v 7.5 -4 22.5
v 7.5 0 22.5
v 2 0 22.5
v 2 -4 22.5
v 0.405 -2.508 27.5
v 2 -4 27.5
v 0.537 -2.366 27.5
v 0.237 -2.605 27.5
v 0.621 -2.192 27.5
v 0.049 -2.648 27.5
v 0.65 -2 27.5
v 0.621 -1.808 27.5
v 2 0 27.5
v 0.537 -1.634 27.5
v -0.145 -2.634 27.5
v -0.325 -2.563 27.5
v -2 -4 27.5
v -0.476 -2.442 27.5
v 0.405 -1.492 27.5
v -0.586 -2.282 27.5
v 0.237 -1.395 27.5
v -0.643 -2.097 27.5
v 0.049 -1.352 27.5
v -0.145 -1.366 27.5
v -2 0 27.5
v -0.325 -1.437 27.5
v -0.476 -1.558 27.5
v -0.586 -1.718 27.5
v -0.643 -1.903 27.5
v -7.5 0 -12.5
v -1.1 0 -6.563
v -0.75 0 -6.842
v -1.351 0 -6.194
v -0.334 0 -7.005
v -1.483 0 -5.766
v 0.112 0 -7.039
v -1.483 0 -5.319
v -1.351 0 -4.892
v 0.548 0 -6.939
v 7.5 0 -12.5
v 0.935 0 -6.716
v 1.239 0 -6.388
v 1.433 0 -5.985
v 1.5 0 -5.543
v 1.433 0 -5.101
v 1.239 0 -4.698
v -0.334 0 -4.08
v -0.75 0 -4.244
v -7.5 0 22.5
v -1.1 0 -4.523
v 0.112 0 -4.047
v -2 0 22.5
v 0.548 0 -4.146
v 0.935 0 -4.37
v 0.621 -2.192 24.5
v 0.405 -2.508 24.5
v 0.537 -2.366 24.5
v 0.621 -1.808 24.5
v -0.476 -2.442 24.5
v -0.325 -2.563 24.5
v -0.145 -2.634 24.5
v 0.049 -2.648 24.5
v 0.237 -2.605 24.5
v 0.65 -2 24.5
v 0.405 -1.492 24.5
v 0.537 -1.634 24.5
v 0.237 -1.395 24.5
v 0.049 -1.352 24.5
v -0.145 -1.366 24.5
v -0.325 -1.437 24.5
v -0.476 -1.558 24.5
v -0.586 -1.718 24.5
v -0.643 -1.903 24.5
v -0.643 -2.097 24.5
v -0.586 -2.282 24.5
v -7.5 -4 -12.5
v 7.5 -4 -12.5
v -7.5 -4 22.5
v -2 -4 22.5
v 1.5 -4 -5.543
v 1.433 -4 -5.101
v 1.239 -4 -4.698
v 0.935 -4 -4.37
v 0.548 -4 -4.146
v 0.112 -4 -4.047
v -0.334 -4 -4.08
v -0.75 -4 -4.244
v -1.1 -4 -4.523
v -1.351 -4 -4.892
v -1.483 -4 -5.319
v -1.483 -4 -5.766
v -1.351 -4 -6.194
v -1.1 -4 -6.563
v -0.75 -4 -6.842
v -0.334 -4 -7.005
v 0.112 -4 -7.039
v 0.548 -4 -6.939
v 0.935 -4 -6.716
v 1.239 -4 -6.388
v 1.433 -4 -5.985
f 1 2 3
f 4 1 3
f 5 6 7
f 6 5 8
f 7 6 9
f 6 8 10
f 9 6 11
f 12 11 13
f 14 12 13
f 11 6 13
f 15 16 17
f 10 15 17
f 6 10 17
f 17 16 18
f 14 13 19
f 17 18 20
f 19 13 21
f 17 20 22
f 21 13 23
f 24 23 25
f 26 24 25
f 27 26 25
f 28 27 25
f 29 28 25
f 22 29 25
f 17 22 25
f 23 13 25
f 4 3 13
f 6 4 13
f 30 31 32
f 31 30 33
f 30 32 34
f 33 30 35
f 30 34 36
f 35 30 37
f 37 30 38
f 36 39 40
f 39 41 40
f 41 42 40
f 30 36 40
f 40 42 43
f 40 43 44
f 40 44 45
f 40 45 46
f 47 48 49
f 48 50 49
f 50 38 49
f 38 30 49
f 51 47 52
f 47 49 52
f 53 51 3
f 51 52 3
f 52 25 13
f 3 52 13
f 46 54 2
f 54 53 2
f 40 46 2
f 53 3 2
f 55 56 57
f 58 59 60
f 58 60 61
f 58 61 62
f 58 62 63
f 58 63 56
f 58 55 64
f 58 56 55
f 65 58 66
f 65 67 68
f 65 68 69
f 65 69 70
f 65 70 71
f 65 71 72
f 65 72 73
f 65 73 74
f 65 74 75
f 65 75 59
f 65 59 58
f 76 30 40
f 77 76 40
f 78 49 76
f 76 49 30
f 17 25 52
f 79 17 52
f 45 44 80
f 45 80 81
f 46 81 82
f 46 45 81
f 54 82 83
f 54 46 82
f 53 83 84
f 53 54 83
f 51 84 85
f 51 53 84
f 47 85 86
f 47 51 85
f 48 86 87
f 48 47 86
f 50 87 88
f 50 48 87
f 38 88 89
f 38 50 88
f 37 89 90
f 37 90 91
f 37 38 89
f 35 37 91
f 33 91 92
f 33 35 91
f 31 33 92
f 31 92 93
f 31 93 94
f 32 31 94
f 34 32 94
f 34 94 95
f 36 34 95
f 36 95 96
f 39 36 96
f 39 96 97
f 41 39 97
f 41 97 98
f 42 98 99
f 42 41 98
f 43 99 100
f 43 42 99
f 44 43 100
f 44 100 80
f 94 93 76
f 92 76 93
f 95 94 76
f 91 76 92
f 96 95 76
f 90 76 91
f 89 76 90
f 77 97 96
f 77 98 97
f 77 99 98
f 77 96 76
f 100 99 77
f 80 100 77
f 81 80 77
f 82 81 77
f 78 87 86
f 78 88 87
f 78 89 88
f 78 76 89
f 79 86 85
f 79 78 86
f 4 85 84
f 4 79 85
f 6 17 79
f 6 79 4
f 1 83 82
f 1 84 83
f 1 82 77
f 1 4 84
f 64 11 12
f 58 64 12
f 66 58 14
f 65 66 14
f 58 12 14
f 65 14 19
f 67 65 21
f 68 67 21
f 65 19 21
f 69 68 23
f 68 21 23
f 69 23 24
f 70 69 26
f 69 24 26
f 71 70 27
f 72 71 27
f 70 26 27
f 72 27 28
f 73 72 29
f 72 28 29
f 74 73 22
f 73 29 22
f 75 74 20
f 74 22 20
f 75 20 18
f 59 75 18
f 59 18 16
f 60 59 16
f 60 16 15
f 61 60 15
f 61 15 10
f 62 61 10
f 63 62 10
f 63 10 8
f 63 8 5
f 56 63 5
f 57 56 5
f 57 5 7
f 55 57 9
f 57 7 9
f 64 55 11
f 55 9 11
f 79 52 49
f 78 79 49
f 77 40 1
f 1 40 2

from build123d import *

# Parameters (mm, degrees)
F0_R     = 1.5
F1_DEPTH = 4
F2_DEPTH = 4
F3_R     = 0.65
F4_DEPTH = 3


with BuildPart() as f1:
    # F0 (on Front) → F1 (new body)
    with BuildSketch(Plane.XZ):
        Polygon((-7.5, -12.5), (7.5, -12.5), (7.5, 22.5), (2, 22.5), (2, 27.5), (-2, 27.5), (-2, 22.5), (-7.5, 22.5), align=None)
        with Locations((0, -5.542802)):
            Circle(F0_R, mode=Mode.SUBTRACT)
    extrude(amount=F1_DEPTH)

    # F0 (on Front) → F2 (join)
    with BuildSketch(Plane.XZ):
        Polygon((-7.5, -12.5), (7.5, -12.5), (7.5, 22.5), (2, 22.5), (2, 27.5), (-2, 27.5), (-2, 22.5), (-7.5, 22.5), align=None)
        with Locations((0, -5.542802)):
            Circle(F0_R, mode=Mode.SUBTRACT)
    extrude(amount=F2_DEPTH)

    # F3 (on face) → F4 (cut)
    with BuildSketch(Plane.XY.offset(27.5)):
        with Locations((0, -2)):
            Circle(F3_R)
    extrude(amount=-F4_DEPTH, mode=Mode.SUBTRACT)


solid = f1.part
